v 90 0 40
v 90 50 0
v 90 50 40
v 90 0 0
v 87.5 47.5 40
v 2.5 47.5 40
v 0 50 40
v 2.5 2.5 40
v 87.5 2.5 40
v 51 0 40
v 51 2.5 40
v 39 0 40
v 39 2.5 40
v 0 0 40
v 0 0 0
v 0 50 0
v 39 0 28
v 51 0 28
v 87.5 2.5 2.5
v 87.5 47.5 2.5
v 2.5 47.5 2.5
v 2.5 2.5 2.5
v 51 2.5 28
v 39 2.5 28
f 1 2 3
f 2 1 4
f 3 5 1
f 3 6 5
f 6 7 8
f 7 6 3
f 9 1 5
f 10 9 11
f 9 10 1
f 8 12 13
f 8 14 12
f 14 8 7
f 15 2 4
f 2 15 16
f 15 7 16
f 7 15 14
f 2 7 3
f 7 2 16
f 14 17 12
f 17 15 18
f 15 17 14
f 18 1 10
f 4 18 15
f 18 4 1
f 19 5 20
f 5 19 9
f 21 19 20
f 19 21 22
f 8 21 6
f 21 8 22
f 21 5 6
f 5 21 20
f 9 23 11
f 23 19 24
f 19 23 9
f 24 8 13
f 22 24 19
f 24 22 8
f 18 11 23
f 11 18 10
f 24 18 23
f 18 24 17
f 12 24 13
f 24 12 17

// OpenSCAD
$fn = 32;

// ----------------------------------------------------------------------
// Enclosure box: notch enclosure
// ----------------------------------------------------------------------

// --- parameters (mm) ---
box_l = 90;               // outer length, X
box_w = 50;               // outer width, Y
box_h = 40;               // outer height
wall_t = 2.5;             // wall thickness
notch_w = 12;             // cable notch width
notch_h = 12;             // cable notch height

inner_h = box_h - wall_t;  // cavity depth
boss_h = inner_h - 2;  // corner boss height

difference() {
  cube([box_l, box_w, box_h]);
  translate([wall_t, wall_t, wall_t])
    cube([box_l - 2 * wall_t, box_w - 2 * wall_t, box_h]);
  translate([box_l / 2 - notch_w / 2, -1, box_h - notch_h])
    cube([notch_w, wall_t + 2, notch_h + 1]);
}
